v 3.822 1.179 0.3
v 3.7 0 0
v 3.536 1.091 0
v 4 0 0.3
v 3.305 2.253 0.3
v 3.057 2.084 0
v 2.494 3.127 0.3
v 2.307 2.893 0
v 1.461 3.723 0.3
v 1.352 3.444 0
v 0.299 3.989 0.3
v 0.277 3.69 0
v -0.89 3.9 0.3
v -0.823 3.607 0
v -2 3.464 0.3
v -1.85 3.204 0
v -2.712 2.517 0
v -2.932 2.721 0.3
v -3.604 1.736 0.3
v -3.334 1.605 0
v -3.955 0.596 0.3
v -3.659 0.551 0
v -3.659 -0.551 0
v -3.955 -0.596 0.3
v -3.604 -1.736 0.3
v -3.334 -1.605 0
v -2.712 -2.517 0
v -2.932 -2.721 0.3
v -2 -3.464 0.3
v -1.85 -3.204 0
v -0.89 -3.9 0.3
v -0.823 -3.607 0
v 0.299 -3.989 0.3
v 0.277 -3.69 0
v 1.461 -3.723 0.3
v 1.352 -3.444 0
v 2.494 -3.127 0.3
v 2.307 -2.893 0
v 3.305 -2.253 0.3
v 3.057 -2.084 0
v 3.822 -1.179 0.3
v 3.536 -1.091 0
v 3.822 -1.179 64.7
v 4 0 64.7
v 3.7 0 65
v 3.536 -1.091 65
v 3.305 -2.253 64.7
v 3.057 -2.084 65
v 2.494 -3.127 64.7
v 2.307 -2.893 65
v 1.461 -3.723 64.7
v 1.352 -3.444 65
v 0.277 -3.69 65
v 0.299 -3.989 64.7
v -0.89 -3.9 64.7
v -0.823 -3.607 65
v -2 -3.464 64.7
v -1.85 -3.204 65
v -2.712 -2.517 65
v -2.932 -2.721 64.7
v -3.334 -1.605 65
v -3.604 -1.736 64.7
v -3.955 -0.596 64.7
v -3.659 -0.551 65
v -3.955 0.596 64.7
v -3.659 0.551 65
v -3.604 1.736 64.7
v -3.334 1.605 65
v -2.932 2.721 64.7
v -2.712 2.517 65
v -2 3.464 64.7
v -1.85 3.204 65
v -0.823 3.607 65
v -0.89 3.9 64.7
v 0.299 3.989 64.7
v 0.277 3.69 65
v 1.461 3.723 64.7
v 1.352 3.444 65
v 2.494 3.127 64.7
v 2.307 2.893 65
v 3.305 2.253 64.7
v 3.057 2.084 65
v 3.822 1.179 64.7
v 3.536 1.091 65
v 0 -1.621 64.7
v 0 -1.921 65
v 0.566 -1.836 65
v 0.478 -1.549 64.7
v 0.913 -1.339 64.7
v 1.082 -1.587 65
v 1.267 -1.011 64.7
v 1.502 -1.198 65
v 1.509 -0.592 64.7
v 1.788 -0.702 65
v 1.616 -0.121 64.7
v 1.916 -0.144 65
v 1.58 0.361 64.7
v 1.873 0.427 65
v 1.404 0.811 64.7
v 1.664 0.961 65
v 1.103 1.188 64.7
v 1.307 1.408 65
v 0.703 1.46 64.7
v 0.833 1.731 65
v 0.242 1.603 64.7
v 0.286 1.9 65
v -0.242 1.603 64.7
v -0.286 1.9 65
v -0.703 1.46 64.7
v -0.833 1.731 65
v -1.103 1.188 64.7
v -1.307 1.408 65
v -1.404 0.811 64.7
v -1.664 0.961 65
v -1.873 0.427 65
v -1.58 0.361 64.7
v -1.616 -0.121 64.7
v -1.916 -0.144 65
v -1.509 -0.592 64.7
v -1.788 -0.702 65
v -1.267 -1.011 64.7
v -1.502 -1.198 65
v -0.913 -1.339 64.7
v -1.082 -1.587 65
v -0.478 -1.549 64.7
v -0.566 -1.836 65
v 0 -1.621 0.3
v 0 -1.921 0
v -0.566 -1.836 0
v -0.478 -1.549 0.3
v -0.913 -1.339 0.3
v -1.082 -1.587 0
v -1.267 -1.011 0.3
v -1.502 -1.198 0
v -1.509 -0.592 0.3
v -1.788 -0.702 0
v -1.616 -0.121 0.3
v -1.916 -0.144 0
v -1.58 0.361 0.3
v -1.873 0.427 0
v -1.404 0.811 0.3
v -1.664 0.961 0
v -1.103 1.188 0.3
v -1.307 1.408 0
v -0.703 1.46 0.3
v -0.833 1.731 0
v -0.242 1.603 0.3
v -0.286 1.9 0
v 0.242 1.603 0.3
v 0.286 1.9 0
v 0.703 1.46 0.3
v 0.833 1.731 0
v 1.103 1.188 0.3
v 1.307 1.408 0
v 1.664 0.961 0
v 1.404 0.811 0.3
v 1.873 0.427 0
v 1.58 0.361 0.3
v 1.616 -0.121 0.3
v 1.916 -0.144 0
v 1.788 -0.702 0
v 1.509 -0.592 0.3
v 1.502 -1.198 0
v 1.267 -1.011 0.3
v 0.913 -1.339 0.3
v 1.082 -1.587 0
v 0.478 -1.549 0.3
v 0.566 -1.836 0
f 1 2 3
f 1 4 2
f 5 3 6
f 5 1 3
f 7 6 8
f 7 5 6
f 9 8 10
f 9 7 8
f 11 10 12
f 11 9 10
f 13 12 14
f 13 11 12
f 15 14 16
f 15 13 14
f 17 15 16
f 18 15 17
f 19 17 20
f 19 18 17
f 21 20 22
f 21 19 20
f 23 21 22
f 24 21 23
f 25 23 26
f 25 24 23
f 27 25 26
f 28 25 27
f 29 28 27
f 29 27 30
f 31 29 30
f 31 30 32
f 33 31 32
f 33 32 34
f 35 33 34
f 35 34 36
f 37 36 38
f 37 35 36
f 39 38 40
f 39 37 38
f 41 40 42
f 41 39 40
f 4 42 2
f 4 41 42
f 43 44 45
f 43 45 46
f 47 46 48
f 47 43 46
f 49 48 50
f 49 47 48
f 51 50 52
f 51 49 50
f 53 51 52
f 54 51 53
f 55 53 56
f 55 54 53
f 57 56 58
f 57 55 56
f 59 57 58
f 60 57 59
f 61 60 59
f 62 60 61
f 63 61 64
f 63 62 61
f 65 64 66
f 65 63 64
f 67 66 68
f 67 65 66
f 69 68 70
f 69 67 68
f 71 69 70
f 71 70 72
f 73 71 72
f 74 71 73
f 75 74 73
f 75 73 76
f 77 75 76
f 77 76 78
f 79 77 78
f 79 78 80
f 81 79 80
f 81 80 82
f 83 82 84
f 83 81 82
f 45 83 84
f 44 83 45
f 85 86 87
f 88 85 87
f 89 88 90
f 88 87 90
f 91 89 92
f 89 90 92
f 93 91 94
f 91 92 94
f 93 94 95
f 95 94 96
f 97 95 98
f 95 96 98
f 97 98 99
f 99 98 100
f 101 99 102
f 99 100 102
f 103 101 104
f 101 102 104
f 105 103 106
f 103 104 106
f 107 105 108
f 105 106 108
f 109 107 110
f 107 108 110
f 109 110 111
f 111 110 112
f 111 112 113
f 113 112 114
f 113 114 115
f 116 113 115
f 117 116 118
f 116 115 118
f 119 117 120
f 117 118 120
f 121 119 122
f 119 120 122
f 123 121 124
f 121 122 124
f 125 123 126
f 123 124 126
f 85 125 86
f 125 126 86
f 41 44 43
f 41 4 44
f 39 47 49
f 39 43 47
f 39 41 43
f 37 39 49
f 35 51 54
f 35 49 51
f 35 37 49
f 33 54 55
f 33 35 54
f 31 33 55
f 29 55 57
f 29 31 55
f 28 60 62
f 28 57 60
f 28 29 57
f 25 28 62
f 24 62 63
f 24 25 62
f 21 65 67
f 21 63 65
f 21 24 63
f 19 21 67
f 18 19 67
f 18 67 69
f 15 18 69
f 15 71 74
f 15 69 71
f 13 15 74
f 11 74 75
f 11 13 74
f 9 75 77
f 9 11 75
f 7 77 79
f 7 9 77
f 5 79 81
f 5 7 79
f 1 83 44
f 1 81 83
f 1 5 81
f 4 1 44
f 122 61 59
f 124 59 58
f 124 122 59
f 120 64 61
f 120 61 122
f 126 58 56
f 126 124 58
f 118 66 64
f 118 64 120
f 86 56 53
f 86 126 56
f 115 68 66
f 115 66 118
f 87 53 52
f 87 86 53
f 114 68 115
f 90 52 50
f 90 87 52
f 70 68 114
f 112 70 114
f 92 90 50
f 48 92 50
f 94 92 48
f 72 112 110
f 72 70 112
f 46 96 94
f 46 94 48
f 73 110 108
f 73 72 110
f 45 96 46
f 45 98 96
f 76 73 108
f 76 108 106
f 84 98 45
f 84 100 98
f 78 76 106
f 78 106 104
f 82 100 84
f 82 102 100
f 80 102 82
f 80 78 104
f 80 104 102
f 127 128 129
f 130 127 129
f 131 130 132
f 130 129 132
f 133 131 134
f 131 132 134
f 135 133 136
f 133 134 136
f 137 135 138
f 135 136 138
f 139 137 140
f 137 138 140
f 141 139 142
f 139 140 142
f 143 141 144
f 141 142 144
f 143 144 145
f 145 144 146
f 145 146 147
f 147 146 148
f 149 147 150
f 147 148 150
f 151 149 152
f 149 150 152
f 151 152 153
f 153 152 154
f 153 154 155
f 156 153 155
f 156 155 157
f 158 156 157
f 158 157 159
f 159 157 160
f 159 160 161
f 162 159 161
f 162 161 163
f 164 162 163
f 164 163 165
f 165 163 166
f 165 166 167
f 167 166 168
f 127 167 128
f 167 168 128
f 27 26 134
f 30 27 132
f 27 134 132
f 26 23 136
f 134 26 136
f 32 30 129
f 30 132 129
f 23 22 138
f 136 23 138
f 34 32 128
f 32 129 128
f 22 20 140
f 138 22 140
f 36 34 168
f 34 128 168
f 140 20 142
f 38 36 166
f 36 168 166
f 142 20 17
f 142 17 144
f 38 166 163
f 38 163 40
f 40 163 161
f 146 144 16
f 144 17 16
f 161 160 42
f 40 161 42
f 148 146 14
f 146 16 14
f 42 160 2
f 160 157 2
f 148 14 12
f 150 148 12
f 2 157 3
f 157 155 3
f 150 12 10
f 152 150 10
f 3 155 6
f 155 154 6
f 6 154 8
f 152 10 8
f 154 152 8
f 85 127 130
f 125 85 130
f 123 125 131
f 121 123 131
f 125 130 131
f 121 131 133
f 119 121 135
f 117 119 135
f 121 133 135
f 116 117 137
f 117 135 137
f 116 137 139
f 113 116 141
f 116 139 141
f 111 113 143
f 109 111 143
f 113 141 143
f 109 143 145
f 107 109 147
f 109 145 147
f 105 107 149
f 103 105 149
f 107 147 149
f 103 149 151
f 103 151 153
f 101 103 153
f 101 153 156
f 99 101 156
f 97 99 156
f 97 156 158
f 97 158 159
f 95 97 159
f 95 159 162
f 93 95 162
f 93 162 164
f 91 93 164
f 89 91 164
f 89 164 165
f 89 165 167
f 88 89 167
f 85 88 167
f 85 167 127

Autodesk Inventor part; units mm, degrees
ref_plane "YZ Plane" through (0, 0, 0) normal (1, 0, 0) x (0, 1, 0)
ref_plane "XZ Plane" through (0, 0, 0) normal (0, 1, 0) x (-1, 0, 0)
ref_plane "XY Plane" through (0, 0, 0) normal (0, 0, 1) x (1, 0, 0)
sketch "スケッチ1" plane through (0, 0, 0) normal (0, 0, 1) x (1, 0, 0)
  circle A0 centre (0, 0) radius 4
  dimension "d0" = 8
extrude "押し出し1" add sketch "スケッチ1" along normal blind 65
sketch "スケッチ2" plane through (0, 0, 65) normal (0, 0, 1) x (1, 0, 0)
  point P0 (0, 0)
hole "穴1" at (0, 0, 65) direction (0, 0, -1) diameter 3.242 end through all thread size "M4x0.7" class "6H" standard "ISO Metric profile"
chamfer "面取り1" distance 0.3 angle 45 4 edges at (-4, 0, 65) (0, 1.621, 65) (0, 1.621, 0) (-4, 0, 0)
properties part number "p8l65ALshaft"
